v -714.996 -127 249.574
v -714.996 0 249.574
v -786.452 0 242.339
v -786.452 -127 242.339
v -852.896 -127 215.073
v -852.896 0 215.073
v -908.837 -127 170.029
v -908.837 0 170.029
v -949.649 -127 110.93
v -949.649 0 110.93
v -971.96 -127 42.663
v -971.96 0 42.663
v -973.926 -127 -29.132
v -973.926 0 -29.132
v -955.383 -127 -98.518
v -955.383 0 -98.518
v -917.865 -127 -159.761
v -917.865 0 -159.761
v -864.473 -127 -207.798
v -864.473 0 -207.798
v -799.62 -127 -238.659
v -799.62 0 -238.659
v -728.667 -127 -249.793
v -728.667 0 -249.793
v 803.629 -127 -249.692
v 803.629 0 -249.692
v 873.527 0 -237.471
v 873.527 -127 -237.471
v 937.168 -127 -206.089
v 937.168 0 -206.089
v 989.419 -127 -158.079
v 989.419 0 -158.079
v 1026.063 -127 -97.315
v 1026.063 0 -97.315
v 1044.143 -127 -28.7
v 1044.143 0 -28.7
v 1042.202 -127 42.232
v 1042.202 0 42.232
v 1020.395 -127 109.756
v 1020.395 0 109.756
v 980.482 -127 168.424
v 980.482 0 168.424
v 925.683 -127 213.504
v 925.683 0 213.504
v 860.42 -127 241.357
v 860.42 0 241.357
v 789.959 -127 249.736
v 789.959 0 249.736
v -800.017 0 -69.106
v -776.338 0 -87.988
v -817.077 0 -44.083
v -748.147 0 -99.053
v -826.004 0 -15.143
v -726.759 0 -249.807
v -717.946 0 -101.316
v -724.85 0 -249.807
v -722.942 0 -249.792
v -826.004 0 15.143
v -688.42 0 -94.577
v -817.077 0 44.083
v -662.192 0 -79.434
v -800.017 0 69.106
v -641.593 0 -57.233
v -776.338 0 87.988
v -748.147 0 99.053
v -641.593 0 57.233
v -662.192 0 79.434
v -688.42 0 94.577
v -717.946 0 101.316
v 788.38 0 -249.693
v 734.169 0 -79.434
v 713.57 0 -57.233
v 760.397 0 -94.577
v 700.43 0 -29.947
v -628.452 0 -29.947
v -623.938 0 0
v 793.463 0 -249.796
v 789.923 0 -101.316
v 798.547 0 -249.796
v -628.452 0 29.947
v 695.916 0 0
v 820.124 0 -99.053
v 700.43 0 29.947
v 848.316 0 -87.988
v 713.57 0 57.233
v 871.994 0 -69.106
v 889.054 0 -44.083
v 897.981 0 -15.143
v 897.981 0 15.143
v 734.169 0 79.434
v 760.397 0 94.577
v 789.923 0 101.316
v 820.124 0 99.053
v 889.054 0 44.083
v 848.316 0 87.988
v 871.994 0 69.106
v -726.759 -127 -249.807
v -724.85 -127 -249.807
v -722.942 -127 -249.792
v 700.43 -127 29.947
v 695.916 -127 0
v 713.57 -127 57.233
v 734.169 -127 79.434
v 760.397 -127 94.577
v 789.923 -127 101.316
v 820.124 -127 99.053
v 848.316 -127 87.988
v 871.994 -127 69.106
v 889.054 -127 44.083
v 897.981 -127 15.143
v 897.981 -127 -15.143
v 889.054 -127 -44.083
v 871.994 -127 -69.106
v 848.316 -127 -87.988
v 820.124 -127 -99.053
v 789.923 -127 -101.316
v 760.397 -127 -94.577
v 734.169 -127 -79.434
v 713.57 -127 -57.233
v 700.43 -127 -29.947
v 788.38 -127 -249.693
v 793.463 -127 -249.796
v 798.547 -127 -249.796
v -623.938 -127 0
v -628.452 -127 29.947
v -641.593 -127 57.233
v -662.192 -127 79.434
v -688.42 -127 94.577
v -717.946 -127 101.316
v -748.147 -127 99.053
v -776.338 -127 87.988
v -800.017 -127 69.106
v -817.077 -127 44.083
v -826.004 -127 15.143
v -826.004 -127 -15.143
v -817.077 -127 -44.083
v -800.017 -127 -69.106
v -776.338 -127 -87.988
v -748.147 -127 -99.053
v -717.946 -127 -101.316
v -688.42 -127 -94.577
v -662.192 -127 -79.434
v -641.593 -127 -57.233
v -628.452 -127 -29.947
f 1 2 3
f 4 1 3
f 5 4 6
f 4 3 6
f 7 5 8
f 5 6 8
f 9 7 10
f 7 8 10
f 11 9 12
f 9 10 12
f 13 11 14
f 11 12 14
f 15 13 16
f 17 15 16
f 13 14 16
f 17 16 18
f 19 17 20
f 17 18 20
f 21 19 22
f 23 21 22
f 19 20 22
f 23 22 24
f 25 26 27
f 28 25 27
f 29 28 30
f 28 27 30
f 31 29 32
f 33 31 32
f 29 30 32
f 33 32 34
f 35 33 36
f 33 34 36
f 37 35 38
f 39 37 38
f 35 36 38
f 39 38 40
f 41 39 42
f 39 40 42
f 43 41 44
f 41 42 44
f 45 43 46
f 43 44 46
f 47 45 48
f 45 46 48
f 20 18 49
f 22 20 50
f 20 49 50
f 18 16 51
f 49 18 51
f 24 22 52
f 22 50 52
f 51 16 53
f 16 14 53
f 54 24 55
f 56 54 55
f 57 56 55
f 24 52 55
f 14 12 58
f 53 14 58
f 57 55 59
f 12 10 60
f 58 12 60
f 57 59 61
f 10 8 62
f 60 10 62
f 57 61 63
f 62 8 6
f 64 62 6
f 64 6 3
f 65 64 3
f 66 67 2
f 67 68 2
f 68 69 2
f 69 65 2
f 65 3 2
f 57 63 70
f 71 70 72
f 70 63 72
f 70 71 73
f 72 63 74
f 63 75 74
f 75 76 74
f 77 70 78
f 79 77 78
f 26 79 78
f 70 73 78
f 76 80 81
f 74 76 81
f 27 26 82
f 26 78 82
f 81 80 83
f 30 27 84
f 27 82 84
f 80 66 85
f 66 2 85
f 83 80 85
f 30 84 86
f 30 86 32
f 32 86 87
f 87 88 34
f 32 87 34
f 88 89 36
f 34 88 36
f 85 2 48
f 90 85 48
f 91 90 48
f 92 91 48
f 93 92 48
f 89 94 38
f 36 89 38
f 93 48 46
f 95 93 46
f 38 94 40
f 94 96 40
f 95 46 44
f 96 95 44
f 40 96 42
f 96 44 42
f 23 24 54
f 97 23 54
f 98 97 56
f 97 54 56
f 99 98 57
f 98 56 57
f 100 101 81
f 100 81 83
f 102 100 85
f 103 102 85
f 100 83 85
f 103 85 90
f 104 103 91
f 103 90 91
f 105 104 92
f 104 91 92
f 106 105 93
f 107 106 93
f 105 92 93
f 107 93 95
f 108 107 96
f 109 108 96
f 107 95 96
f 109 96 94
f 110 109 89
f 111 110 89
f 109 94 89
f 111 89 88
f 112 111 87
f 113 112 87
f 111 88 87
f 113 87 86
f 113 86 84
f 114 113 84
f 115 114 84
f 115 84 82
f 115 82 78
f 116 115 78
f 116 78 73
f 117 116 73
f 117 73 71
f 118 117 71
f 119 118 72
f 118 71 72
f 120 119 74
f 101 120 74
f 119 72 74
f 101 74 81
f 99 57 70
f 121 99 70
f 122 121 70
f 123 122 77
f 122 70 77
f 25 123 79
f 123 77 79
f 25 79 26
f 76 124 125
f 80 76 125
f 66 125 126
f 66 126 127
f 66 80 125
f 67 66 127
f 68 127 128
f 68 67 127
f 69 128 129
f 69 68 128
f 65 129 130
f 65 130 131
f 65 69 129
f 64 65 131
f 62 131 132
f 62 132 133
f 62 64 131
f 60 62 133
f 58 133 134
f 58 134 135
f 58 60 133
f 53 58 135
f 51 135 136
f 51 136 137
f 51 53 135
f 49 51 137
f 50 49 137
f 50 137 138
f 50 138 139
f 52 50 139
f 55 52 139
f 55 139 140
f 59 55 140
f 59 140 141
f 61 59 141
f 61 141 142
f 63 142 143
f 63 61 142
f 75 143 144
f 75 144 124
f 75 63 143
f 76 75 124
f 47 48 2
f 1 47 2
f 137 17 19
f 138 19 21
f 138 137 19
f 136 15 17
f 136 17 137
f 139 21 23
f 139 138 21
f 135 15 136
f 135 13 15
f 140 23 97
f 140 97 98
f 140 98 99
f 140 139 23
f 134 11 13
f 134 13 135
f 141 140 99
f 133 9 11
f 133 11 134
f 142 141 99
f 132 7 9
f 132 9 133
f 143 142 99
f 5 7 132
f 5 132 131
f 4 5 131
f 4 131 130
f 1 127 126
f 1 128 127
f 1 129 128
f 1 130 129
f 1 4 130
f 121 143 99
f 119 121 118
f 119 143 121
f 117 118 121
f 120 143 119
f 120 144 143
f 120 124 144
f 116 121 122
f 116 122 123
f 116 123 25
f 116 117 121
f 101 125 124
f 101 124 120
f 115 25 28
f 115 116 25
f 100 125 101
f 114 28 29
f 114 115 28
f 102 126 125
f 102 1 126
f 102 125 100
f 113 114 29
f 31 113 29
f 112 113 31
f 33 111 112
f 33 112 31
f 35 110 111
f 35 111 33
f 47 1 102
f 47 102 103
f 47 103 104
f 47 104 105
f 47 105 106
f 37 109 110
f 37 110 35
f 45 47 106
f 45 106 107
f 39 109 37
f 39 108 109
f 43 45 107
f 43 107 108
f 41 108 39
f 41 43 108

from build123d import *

# Parameters (mm, degrees)
F0_R     = 101.6
F1_DEPTH = 127


with BuildPart() as f1:
    # F0 (on Front) → F1 (new body)
    with BuildSketch(Plane.XZ):
        with BuildLine():
            ThreePointArc((-722.9421635172, -249.79241048), (-548.1645057738, -175.6208384233), (-476.0120778236, 0))
            ThreePointArc((-476.0120778236, 0), (-545.3928207836, 172.7720479201), (-714.9961059612, 249.5743505755))
            ThreePointArc((-714.9961059612, 249.5743505755), (-975.5365160272, 6.8364028409), (-728.6671666698, -249.7927866438))
            Line((-728.6671666698, -249.7927866438), (-722.9421635172, -249.79241048))
        make_face()
        with Locations((-725.5384325981, 0)):
            Circle(F0_R, mode=Mode.SUBTRACT)
        with BuildLine():
            ThreePointArc((-714.9961059612, 249.5743505755), (-545.3928207836, 172.7720479201), (-476.0120778236, 0))
            Line((-476.0120778236, 0), (546.179202095, 0))
            ThreePointArc((546.179202095, 0), (617.2275203446, 174.4968628404), (789.9586907535, 249.7362237922))
            Line((789.9586907535, 249.7362237922), (-714.9961059612, 249.5743505755))
        make_face()
        with BuildLine():
            Line((546.179202095, 0), (-476.0120778236, 0))
            ThreePointArc((-476.0120778236, 0), (-548.1645057738, -175.6208384233), (-722.9421635172, -249.79241048))
            Line((-722.9421635172, -249.79241048), (788.379779932, -249.6931084215))
            ThreePointArc((788.379779932, -249.6931084215), (616.6767568201, -173.9308542911), (546.179202095, 0))
        make_face()
        with BuildLine():
            ThreePointArc((789.9586907535, 249.7362237922), (617.2275203446, 174.4968628404), (546.179202095, 0))
            ThreePointArc((546.179202095, 0), (616.6767568201, -173.9308542911), (788.379779932, -249.6931084215))
            Line((788.379779932, -249.6931084215), (803.6294365785, -249.6921064362))
            ThreePointArc((803.6294365785, -249.6921064362), (975.3110751844, -173.91907218), (1045.797202095, 0))
            ThreePointArc((1045.797202095, 0), (970.4850649354, 178.7606817504), (789.9586907535, 249.7362237922))
        make_face()
        with BuildLine():
            ThreePointArc((899.1158691406, 0), (797.5158691406, -101.6), (695.9158691406, 0))
            ThreePointArc((695.9158691406, 0), (797.5158691406, 101.6), (899.1158691406, 0))
        make_face(mode=Mode.SUBTRACT)
        with BuildLine():
            ThreePointArc((-728.6671666698, -249.7927866438), (-725.8046640158, -249.8089994608), (-722.9421635172, -249.79241048))
            Line((-722.9421635172, -249.79241048), (-728.6671666698, -249.7927866438))
        make_face()
        with BuildLine():
            Line((803.6294365785, -249.6921064362), (788.379779932, -249.6931084215))
            ThreePointArc((788.379779932, -249.6931084215), (796.0046159028, -249.8089994608), (803.6294365785, -249.6921064362))
        make_face()
    extrude(amount=F1_DEPTH)


solid = f1.part
